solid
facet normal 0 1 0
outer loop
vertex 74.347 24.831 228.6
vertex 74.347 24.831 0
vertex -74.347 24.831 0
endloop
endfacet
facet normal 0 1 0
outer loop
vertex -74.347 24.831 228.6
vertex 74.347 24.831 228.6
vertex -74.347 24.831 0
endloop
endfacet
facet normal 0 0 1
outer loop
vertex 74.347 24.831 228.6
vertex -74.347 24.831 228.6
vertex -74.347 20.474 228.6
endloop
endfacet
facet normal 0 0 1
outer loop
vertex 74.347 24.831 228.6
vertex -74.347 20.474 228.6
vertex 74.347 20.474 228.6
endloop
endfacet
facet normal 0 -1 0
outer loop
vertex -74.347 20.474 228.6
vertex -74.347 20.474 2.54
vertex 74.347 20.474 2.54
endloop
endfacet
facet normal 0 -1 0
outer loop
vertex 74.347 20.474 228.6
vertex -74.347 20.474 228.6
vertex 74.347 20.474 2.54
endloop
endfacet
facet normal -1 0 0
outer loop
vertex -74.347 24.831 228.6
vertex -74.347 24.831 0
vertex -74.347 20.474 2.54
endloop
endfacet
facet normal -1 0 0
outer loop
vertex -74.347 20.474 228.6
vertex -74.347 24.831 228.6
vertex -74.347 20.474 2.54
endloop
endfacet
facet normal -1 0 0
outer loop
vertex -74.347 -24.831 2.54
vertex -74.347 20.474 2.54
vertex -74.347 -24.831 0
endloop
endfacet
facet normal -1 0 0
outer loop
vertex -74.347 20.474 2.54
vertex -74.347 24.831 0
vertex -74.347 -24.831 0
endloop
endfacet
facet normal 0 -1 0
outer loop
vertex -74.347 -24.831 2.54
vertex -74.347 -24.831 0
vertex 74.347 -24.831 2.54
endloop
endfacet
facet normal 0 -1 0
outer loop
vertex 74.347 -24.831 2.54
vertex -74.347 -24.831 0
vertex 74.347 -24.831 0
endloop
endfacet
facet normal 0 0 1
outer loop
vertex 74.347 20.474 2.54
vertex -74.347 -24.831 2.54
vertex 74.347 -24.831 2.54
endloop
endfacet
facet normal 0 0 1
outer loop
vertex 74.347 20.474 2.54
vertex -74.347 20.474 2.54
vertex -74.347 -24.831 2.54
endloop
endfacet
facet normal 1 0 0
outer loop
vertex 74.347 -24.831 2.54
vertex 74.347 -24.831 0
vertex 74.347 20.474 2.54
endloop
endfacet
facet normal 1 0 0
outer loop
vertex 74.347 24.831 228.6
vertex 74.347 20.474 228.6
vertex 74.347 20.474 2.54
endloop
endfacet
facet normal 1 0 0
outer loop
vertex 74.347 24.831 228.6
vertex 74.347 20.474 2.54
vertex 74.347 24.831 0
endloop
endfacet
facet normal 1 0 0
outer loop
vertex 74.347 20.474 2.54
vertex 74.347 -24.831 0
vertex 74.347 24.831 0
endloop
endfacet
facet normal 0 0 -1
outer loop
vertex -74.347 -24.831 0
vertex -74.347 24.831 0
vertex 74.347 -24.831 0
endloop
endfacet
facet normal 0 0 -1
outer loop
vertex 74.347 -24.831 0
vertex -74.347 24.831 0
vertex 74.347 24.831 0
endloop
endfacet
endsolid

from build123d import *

# Parameters (mm, degrees)
F1_DEPTH = 228.6
F0_W     = 14.8112885654
F0_H     = 40.948856622
F0_W_2   = 2.9041729867
F0_W_3   = 24.6854852885
F0_W_4   = 4.3562594801
F0_W_5   = 24.3950609583
F0_W_6   = 6.6796054598
F0_W_7   = 55.7601368055
F2_DEPTH = 2.54


with BuildPart() as f1:
    # F0 (on Top) → F1 (new body)
    with BuildSketch(Plane.XY):
        Polygon((65.9247487783, 20.474428311), (74.3468627334, 20.474428311), (74.3468627334, 24.8306896538), (-74.3468627334, 24.8306896538), (-74.3468627334, 20.474428311), (-67.667260766, 20.474428311), (-52.8559722006, 20.474428311), (-49.9517992139, 20.474428311), (-25.2663139254, 20.474428311), (-20.9100544453, 20.474428311), (3.4850065131, 20.474428311), (10.1646119729, 20.474428311), align=None)
    extrude(amount=F1_DEPTH)

    # F0 (on Top) → F2 (join)
    with BuildSketch(Plane.XY):
        Polygon((65.9247487783, -24.8306896538), (74.3468627334, -24.8306896538), (74.3468627334, 20.474428311), (65.9247487783, 20.474428311), (65.9247487783, -20.474428311), align=None)
        Polygon((-67.667260766, -24.8306896538), (65.9247487783, -24.8306896538), (65.9247487783, -20.474428311), (10.1646119729, -20.474428311), (3.4850065131, -20.474428311), (-20.9100544453, -20.474428311), (-25.2663139254, -20.474428311), (-49.9517992139, -20.474428311), (-52.8559722006, -20.474428311), (-67.667260766, -20.474428311), align=None)
        Polygon((65.9247487783, 20.474428311), (74.3468627334, 20.474428311), (74.3468627334, 24.8306896538), (-74.3468627334, 24.8306896538), (-74.3468627334, 20.474428311), (-67.667260766, 20.474428311), (-52.8559722006, 20.474428311), (-49.9517992139, 20.474428311), (-25.2663139254, 20.474428311), (-20.9100544453, 20.474428311), (3.4850065131, 20.474428311), (10.1646119729, 20.474428311), align=None)
        Polygon((-74.3468627334, -24.8306896538), (-67.667260766, -24.8306896538), (-67.667260766, -20.474428311), (-67.667260766, 20.474428311), (-74.3468627334, 20.474428311), align=None)
        with Locations((-60.2616164833, 0)):
            Rectangle(F0_W, F0_H)
        with Locations((-51.4038857073, 0)):
            Rectangle(F0_W_2, F0_H)
        with Locations((-37.6090565696, 0)):
            Rectangle(F0_W_3, F0_H)
        with Locations((-23.0881841853, 0)):
            Rectangle(F0_W_4, F0_H)
        with Locations((-8.7125239661, 0)):
            Rectangle(F0_W_5, F0_H)
        with Locations((6.824809243, 0)):
            Rectangle(F0_W_6, F0_H)
        with Locations((38.0446803756, 0)):
            Rectangle(F0_W_7, F0_H)
    extrude(amount=F2_DEPTH)


solid = f1.part
